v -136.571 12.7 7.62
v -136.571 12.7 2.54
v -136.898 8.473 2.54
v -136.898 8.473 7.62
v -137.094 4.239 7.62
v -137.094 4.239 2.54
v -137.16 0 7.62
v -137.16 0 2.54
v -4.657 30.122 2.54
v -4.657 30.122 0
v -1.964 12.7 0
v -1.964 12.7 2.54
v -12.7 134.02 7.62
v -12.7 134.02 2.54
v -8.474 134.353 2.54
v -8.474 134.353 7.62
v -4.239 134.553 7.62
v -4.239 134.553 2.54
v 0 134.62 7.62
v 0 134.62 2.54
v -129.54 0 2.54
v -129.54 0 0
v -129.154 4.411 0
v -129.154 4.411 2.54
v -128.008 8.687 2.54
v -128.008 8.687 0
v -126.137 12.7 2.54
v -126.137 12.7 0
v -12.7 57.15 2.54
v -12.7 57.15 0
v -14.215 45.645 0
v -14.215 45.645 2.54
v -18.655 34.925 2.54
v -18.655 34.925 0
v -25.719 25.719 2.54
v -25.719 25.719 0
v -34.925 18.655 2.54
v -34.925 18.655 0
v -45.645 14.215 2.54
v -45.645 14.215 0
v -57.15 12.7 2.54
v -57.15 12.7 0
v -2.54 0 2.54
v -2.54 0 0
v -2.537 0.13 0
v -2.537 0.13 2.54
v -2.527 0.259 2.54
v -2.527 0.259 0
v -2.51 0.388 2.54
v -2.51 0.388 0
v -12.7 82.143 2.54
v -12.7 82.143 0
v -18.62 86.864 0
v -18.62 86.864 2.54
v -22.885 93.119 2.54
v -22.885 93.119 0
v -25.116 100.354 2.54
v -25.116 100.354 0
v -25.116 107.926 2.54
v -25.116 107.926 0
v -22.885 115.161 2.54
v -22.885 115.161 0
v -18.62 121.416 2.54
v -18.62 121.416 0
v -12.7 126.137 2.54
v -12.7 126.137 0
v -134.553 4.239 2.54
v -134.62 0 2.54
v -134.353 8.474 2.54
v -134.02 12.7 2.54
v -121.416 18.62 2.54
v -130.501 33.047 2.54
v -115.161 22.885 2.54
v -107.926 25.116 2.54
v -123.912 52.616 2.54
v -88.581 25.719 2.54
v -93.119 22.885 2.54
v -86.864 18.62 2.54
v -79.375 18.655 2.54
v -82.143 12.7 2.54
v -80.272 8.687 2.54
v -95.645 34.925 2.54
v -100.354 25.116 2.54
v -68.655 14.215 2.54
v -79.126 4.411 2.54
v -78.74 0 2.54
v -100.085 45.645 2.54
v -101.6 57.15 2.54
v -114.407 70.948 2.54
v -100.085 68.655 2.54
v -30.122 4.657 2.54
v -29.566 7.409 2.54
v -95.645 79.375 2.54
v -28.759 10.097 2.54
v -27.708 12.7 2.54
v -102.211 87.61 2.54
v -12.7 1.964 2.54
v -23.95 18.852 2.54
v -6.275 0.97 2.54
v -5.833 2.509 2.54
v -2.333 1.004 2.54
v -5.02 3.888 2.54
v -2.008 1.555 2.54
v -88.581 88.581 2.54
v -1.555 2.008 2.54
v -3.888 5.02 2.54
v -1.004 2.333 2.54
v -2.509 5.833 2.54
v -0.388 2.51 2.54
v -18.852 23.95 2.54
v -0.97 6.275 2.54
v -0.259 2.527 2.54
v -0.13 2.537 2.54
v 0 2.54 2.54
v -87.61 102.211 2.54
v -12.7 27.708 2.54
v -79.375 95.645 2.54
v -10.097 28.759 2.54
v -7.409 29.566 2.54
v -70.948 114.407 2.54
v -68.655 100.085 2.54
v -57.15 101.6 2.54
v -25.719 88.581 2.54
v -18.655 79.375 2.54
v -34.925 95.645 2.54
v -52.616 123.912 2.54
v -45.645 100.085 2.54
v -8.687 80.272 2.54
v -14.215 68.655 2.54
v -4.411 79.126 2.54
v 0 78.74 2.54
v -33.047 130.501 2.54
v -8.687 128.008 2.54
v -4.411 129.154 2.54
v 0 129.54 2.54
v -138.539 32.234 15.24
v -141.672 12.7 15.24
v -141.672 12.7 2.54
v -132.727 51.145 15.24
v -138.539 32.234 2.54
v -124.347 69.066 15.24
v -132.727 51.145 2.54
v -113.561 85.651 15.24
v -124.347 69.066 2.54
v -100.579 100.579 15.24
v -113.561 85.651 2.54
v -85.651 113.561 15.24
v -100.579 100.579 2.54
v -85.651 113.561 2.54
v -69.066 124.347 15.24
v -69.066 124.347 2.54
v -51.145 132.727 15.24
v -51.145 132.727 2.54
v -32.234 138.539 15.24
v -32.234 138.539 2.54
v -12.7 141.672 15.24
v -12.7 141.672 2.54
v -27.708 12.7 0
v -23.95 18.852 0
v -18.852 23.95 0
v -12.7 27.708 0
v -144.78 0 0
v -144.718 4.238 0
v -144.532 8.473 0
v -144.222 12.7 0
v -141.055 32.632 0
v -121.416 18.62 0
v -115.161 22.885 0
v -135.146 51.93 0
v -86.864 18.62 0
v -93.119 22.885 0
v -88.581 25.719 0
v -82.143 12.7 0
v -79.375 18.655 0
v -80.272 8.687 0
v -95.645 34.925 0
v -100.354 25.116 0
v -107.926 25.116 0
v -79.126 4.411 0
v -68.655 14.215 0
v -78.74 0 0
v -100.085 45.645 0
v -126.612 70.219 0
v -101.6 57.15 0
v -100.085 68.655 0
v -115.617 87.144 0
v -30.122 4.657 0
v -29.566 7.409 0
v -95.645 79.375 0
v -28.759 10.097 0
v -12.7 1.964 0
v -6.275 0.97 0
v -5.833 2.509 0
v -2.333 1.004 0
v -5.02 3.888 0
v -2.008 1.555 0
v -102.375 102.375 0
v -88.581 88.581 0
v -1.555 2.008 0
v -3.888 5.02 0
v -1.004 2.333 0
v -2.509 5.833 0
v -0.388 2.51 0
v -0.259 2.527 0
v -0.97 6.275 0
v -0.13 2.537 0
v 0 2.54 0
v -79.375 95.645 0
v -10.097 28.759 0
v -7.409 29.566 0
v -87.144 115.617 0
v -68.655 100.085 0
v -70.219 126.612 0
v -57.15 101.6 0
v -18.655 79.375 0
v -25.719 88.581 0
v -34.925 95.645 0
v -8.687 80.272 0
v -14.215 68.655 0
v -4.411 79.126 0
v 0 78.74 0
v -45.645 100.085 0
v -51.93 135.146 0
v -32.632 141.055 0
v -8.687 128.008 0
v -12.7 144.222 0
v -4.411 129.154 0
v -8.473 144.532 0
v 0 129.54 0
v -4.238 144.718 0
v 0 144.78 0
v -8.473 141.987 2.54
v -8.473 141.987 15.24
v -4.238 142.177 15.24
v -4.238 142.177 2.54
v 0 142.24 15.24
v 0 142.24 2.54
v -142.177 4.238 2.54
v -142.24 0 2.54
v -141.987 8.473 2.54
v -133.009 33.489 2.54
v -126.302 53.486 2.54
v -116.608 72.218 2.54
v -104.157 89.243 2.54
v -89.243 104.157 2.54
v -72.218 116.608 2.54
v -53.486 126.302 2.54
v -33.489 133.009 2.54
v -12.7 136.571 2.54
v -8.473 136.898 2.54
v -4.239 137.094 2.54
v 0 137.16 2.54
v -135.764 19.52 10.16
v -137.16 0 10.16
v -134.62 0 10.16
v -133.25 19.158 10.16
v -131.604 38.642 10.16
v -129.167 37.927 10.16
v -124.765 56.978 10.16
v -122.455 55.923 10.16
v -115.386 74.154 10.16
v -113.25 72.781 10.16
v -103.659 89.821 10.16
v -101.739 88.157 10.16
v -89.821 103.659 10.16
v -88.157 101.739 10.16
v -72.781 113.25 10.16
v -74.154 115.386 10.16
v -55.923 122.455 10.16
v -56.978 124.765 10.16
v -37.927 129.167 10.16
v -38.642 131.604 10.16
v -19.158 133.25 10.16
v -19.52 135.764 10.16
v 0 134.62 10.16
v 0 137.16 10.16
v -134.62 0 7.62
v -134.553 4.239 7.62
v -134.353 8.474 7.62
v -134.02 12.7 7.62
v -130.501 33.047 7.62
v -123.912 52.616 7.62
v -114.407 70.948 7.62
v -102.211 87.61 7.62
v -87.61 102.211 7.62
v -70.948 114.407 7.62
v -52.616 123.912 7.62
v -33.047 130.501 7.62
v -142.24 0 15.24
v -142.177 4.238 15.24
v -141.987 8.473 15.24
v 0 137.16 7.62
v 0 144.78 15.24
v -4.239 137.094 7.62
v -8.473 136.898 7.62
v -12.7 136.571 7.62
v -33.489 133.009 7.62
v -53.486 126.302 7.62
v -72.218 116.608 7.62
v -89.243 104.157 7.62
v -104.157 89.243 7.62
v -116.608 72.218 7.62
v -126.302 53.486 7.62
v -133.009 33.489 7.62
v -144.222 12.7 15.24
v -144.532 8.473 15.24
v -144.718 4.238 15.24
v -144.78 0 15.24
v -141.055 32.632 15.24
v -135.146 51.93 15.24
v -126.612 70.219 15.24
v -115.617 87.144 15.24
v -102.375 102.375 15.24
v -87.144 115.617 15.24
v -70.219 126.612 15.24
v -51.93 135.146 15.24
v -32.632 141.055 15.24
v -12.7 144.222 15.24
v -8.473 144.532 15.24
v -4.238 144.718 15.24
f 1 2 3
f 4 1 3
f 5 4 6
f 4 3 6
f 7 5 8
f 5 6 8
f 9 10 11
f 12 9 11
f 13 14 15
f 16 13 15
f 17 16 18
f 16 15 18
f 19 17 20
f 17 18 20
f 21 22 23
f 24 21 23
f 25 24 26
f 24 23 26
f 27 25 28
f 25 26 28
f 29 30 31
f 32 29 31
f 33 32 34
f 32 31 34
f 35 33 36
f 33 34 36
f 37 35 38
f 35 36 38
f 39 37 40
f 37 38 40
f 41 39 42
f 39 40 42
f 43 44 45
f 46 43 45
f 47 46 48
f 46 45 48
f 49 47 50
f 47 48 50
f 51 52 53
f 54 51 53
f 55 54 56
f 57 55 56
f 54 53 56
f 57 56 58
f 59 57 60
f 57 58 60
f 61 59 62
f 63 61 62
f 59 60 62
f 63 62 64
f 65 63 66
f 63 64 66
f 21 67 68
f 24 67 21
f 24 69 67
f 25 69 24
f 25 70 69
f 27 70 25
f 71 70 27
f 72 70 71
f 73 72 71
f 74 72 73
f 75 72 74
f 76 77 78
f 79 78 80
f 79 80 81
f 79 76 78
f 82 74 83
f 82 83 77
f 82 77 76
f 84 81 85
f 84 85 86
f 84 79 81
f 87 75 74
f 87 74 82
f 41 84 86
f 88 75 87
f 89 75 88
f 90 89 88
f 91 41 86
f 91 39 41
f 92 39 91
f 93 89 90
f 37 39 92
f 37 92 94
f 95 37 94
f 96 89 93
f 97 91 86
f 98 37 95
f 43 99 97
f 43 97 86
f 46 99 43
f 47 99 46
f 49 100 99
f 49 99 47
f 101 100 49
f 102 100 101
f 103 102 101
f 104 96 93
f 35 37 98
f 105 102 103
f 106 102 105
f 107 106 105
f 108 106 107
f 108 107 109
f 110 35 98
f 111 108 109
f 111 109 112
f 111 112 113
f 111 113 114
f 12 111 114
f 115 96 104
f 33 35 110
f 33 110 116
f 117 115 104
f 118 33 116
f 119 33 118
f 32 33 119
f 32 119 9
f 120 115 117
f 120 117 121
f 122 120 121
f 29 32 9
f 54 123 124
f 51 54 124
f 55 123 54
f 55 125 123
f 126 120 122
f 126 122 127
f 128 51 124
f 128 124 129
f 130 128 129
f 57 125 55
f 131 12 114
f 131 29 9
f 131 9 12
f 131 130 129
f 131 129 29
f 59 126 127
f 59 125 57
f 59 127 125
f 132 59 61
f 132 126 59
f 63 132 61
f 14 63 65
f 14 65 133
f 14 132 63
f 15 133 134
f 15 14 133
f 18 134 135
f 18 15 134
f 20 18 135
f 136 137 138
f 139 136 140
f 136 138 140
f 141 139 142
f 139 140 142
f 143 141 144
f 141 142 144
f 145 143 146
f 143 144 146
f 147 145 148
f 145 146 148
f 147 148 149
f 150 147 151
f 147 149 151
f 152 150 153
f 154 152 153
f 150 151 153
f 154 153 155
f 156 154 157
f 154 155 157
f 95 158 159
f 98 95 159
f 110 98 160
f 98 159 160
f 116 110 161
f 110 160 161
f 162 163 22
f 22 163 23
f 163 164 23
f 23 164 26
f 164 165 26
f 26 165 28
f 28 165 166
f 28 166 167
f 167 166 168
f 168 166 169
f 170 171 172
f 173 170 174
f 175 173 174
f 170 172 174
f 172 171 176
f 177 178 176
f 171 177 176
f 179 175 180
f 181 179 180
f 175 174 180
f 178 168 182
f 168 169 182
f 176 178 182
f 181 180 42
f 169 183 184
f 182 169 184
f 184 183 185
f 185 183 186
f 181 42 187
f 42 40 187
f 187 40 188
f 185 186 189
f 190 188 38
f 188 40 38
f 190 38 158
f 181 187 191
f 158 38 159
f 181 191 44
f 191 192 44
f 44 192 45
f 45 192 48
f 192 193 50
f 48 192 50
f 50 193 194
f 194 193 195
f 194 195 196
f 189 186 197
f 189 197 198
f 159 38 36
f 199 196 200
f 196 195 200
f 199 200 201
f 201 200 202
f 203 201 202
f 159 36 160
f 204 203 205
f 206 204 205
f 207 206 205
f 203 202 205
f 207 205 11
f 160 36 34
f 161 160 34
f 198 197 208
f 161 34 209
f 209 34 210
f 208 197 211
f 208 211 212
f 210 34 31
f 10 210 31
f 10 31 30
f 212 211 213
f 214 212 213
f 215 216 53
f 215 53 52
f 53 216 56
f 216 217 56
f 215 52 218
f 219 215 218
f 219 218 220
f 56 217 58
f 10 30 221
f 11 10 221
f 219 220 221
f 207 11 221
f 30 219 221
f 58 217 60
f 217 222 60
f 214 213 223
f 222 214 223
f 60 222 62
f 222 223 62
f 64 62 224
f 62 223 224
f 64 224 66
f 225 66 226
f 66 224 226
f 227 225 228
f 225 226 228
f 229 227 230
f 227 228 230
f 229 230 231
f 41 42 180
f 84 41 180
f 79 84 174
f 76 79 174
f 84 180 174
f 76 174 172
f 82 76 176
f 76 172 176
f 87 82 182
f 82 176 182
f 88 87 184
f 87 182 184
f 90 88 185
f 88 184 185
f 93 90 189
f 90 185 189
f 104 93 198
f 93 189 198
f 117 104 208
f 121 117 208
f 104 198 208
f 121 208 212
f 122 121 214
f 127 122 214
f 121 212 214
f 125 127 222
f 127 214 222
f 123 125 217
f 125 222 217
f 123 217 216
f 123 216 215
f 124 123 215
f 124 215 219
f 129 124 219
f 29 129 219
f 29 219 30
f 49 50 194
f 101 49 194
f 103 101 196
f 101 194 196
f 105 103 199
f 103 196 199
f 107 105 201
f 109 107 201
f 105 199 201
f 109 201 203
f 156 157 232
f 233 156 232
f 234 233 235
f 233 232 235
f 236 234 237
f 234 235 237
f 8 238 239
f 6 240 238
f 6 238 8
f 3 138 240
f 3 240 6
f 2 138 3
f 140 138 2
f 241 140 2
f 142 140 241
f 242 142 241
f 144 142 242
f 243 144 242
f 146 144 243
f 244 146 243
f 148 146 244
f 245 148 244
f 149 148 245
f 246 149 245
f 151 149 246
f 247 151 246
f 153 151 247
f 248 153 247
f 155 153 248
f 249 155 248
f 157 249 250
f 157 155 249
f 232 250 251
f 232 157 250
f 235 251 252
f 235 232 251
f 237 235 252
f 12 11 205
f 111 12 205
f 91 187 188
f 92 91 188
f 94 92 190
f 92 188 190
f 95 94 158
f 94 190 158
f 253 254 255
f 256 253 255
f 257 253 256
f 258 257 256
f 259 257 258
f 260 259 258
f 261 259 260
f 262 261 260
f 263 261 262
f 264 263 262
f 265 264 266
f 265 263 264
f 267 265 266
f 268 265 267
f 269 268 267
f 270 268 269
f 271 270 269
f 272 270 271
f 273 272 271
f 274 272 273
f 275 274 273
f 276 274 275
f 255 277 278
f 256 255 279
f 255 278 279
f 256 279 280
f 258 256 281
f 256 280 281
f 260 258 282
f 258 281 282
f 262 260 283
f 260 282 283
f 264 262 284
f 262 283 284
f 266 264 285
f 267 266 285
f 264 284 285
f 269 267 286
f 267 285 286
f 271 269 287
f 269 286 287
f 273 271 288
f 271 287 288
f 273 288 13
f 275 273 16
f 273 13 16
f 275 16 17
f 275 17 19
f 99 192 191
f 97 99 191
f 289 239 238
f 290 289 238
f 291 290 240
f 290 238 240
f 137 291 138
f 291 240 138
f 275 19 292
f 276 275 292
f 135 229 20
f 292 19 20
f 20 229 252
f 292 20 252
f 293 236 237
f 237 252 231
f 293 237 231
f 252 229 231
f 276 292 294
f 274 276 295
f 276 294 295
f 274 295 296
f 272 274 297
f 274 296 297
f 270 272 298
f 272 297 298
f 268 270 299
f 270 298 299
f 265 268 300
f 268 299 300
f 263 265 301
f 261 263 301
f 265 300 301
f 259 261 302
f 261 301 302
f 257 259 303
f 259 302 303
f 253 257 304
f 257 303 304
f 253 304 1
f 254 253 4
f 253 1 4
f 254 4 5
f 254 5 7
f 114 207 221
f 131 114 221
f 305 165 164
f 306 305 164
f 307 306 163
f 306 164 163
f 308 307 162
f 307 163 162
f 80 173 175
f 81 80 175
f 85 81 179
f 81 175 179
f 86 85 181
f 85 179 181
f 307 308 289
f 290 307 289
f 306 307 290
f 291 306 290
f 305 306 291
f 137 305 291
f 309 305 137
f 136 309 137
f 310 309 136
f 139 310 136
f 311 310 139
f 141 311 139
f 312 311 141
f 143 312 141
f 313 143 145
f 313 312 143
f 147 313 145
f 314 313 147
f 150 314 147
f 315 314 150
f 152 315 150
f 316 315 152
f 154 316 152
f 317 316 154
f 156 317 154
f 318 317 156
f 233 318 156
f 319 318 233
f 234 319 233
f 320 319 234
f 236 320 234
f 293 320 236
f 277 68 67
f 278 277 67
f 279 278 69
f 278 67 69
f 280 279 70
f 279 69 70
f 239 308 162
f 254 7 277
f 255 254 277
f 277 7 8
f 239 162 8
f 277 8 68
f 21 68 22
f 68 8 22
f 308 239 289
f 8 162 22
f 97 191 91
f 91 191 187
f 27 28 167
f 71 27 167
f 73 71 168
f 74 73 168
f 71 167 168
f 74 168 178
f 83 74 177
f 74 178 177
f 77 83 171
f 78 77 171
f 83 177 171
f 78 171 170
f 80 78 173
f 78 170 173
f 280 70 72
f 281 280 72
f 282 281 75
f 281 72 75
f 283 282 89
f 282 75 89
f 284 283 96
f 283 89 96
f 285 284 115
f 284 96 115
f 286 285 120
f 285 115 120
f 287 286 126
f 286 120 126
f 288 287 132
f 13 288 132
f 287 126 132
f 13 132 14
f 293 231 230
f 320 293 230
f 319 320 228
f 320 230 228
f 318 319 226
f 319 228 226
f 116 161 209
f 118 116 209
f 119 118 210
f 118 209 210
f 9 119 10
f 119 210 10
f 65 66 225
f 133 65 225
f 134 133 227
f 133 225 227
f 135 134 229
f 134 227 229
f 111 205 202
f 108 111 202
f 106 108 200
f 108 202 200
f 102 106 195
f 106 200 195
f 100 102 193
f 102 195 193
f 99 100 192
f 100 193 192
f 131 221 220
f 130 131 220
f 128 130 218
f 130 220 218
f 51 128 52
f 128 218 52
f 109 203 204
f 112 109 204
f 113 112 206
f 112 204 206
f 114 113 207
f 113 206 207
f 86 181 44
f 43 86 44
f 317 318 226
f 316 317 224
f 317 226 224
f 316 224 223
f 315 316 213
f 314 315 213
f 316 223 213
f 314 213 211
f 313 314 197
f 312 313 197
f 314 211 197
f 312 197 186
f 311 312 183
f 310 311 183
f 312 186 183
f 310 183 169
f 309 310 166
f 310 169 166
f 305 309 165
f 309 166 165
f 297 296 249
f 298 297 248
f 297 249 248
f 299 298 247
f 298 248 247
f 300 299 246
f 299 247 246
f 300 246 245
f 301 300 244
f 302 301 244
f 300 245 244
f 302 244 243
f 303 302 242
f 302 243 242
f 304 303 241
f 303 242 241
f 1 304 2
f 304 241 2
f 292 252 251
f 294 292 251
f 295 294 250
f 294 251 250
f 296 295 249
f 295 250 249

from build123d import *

# Parameters (mm, degrees)
F1_DEPTH = 2.54
F2_DEPTH = 7.62
F3_DEPTH = 2.54
F4_DEPTH = 15.24


with BuildPart() as f1:
    # F0 (on Top) → F1 (new body)
    with BuildSketch(Plane.XY):
        with BuildLine():
            Line((-6.2754395375, 0.9702363687), (-12.7, 1.9635281017))
            Line((-12.7, 1.9635281017), (-12.7, 0))
            Line((-12.7, 0), (-6.35, 0))
            ThreePointArc((-6.35, 0), (-6.3313324452, 0.4865485263), (-6.2754395375, 0.9702363687))
        make_face()
        with BuildLine():
            Line((-6.35, 0), (-2.54, 0))
            ThreePointArc((-2.54, 0), (-2.5325329781, 0.1946194105), (-2.510175815, 0.3880945475))
            Line((-2.510175815, 0.3880945475), (-6.2754395375, 0.9702363687))
            ThreePointArc((-6.2754395375, 0.9702363687), (-6.3313324452, 0.4865485263), (-6.35, 0))
        make_face()
        with BuildLine():
            ThreePointArc((-2.510175815, 0.3880945475), (-1.7960512242, 1.7960512242), (-0.3880945475, 2.510175815))
            Line((-0.3880945475, 2.510175815), (-0.9702363687, 6.2754395375))
            ThreePointArc((-0.9702363687, 6.2754395375), (-4.4901280605, 4.4901280605), (-6.2754395375, 0.9702363687))
            Line((-6.2754395375, 0.9702363687), (-2.510175815, 0.3880945475))
        make_face()
        with BuildLine():
            Line((0, 2.54), (0, 6.35))
            ThreePointArc((0, 6.35), (-0.4865485263, 6.3313324452), (-0.9702363687, 6.2754395375))
            Line((-0.9702363687, 6.2754395375), (-0.3880945475, 2.510175815))
            ThreePointArc((-0.3880945475, 2.510175815), (-0.1946194105, 2.5325329781), (0, 2.54))
        make_face()
        with BuildLine():
            Line((0, 6.35), (0, 12.7))
            Line((0, 12.7), (-1.9635281017, 12.7))
            Line((-1.9635281017, 12.7), (-0.9702363687, 6.2754395375))
            ThreePointArc((-0.9702363687, 6.2754395375), (-0.4865485263, 6.3313324452), (0, 6.35))
        make_face()
        with BuildLine():
            Line((0, 12.7), (0, 30.48))
            ThreePointArc((0, 30.48), (-2.3354329262, 30.3903957369), (-4.6571345698, 30.12210978))
            Line((-4.6571345698, 30.12210978), (-1.9635281017, 12.7))
            Line((-1.9635281017, 12.7), (0, 12.7))
        make_face()
        with BuildLine():
            Line((-12.7, 1.9635281017), (-30.12210978, 4.6571345698))
            ThreePointArc((-30.12210978, 4.6571345698), (-30.3903957369, 2.3354329262), (-30.48, 0))
            Line((-30.48, 0), (-12.7, 0))
            Line((-12.7, 0), (-12.7, 1.9635281017))
        make_face()
        with BuildLine():
            Line((-30.12210978, 4.6571345698), (-82.1429547439, 12.7))
            ThreePointArc((-82.1429547439, 12.7), (-79.6054840123, 6.5740037456), (-78.74, 0))
            Line((-78.74, 0), (-30.48, 0))
            ThreePointArc((-30.48, 0), (-30.3903957369, 2.3354329262), (-30.12210978, 4.6571345698))
        make_face()
        with BuildLine():
            Line((-12.7, 126.1370452561), (-12.7, 134.0196045361))
            ThreePointArc((-12.7, 134.0196045361), (-95.1907148833, 95.1907148833), (-134.0196045361, 12.7))
            Line((-134.0196045361, 12.7), (-126.1370452561, 12.7))
            ThreePointArc((-126.1370452561, 12.7), (-104.14, 25.4), (-82.1429547439, 12.7))
            Line((-82.1429547439, 12.7), (-57.15, 12.7))
            ThreePointArc((-57.15, 12.7), (-88.5808964237, 88.5808964237), (-12.7, 57.15))
            Line((-12.7, 57.15), (-12.7, 82.1429547439))
            ThreePointArc((-12.7, 82.1429547439), (-25.4, 104.14), (-12.7, 126.1370452561))
        make_face()
        with BuildLine():
            Line((-126.1370452561, 12.7), (-134.0196045361, 12.7))
            ThreePointArc((-134.0196045361, 12.7), (-134.4698173618, 6.3570919986), (-134.62, 0))
            Line((-134.62, 0), (-129.54, 0))
            ThreePointArc((-129.54, 0), (-128.6745159877, 6.5740037456), (-126.1370452561, 12.7))
        make_face()
        with BuildLine():
            Line((-57.15, 12.7), (-82.1429547439, 12.7))
            Line((-82.1429547439, 12.7), (-30.12210978, 4.6571345698))
            ThreePointArc((-30.12210978, 4.6571345698), (-29.1934246673, 8.7620977053), (-27.7081287712, 12.7))
            Line((-27.7081287712, 12.7), (-57.15, 12.7))
        make_face()
        with BuildLine():
            Line((-12.7, 27.7081287712), (-12.7, 57.15))
            ThreePointArc((-12.7, 57.15), (-25.7191035763, 25.7191035763), (-57.15, 12.7))
            Line((-57.15, 12.7), (-27.7081287712, 12.7))
            ThreePointArc((-27.7081287712, 12.7), (-21.5526146906, 21.5526146906), (-12.7, 27.7081287712))
        make_face()
        with BuildLine():
            Line((-4.6571345698, 30.12210978), (-12.7, 82.1429547439))
            Line((-12.7, 82.1429547439), (-12.7, 57.15))
            Line((-12.7, 57.15), (-12.7, 27.7081287712))
            ThreePointArc((-12.7, 27.7081287712), (-8.7620977053, 29.1934246673), (-4.6571345698, 30.12210978))
        make_face()
        with BuildLine():
            Line((0, 30.48), (0, 78.74))
            ThreePointArc((0, 78.74), (-6.5740037456, 79.6054840123), (-12.7, 82.1429547439))
            Line((-12.7, 82.1429547439), (-4.6571345698, 30.12210978))
            ThreePointArc((-4.6571345698, 30.12210978), (-2.3354329262, 30.3903957369), (0, 30.48))
        make_face()
        with BuildLine():
            Line((0, 129.54), (0, 134.62))
            ThreePointArc((0, 134.62), (-6.3570919986, 134.4698173618), (-12.7, 134.0196045361))
            Line((-12.7, 134.0196045361), (-12.7, 126.1370452561))
            ThreePointArc((-12.7, 126.1370452561), (-6.5740037456, 128.6745159877), (0, 129.54))
        make_face()
    extrude(amount=F1_DEPTH)

    # F0 (on Top) → F2 (join)
    with BuildSketch(Plane.XY):
        with BuildLine():
            ThreePointArc((-134.62, 0), (-134.4698173618, 6.3570919986), (-134.0196045361, 12.7))
            Line((-134.0196045361, 12.7), (-136.5707713971, 12.7))
            ThreePointArc((-136.5707713971, 12.7), (-137.0126136617, 6.3568307817), (-137.16, 0))
            Line((-137.16, 0), (-134.62, 0))
        make_face()
        with BuildLine():
            ThreePointArc((-134.0196045361, 12.7), (-95.1907148833, 95.1907148833), (-12.7, 134.0196045361))
            Line((-12.7, 134.0196045361), (-12.7, 136.5707713971))
            ThreePointArc((-12.7, 136.5707713971), (-96.9867661075, 96.9867661075), (-136.5707713971, 12.7))
            Line((-136.5707713971, 12.7), (-134.0196045361, 12.7))
        make_face()
        with BuildLine():
            ThreePointArc((-12.7, 134.0196045361), (-6.3570919986, 134.4698173618), (0, 134.62))
            Line((0, 134.62), (0, 137.16))
            ThreePointArc((0, 137.16), (-6.3568307817, 137.0126136617), (-12.7, 136.5707713971))
            Line((-12.7, 136.5707713971), (-12.7, 134.0196045361))
        make_face()
    extrude(amount=F2_DEPTH)

    # F0 (on Top) + F2_face (on face) → F3 (join)
    with BuildSketch(Plane.XY):
        with BuildLine():
            ThreePointArc((-137.16, 0), (-137.0126136617, 6.3568307817), (-136.5707713971, 12.7))
            Line((-136.5707713971, 12.7), (-141.6719012366, 12.7))
            ThreePointArc((-141.6719012366, 12.7), (-142.0979043334, 6.3563499), (-142.24, 0))
            Line((-142.24, 0), (-137.16, 0))
        make_face()
        with BuildLine():
            ThreePointArc((-136.5707713971, 12.7), (-96.9867661075, 96.9867661075), (-12.7, 136.5707713971))
            Line((-12.7, 136.5707713971), (-12.7, 141.6719012366))
            ThreePointArc((-12.7, 141.6719012366), (-100.578868556, 100.578868556), (-141.6719012366, 12.7))
            Line((-141.6719012366, 12.7), (-136.5707713971, 12.7))
        make_face()
        with BuildLine():
            ThreePointArc((-12.7, 136.5707713971), (-6.3568307817, 137.0126136617), (0, 137.16))
            Line((0, 137.16), (0, 142.24))
            ThreePointArc((0, 142.24), (-6.3563499, 142.0979043334), (-12.7, 141.6719012366))
            Line((-12.7, 141.6719012366), (-12.7, 136.5707713971))
        make_face()
    with BuildSketch(Plane(origin=(-86.5127795808, 86.5127795808, 7.62), x_dir=(1, 0, 0), z_dir=(0, 0, 1))):
        with BuildLine():
            Line((-50.6472204192, -86.5127795808), (-48.1072204192, -86.5127795808))
            ThreePointArc((-48.1072204192, -86.5127795808), (-8.6779353026, 8.6779353025), (86.5127795808, 48.1072204192))
            Line((86.5127795808, 48.1072204192), (86.5127795808, 50.6472204192))
            ThreePointArc((86.5127795808, 50.6472204192), (-10.4739865268, 10.4739865267), (-50.6472204192, -86.5127795808))
        make_face()
    extrude(amount=F3_DEPTH)

    # F0 (on Top) → F4 (join)
    with BuildSketch(Plane.XY):
        with BuildLine():
            ThreePointArc((-142.24, 0), (-142.0979043334, 6.3563499), (-141.6719012366, 12.7))
            Line((-141.6719012366, 12.7), (-144.2219067964, 12.7))
            ThreePointArc((-144.2219067964, 12.7), (-144.6404094055, 6.3561283031), (-144.78, 0))
            Line((-144.78, 0), (-142.24, 0))
        make_face()
        with BuildLine():
            ThreePointArc((-141.6719012366, 12.7), (-100.578868556, 100.578868556), (-12.7, 141.6719012366))
            Line((-12.7, 141.6719012366), (-12.7, 144.2219067964))
            ThreePointArc((-12.7, 144.2219067964), (-102.3749197802, 102.3749197802), (-144.2219067964, 12.7))
            Line((-144.2219067964, 12.7), (-141.6719012366, 12.7))
        make_face()
        with BuildLine():
            ThreePointArc((-12.7, 141.6719012366), (-6.3563499, 142.0979043334), (0, 142.24))
            Line((0, 142.24), (0, 144.78))
            ThreePointArc((0, 144.78), (-6.3561283031, 144.6404094055), (-12.7, 144.2219067964))
            Line((-12.7, 144.2219067964), (-12.7, 141.6719012366))
        make_face()
    extrude(amount=F4_DEPTH)


solid = f1.part
